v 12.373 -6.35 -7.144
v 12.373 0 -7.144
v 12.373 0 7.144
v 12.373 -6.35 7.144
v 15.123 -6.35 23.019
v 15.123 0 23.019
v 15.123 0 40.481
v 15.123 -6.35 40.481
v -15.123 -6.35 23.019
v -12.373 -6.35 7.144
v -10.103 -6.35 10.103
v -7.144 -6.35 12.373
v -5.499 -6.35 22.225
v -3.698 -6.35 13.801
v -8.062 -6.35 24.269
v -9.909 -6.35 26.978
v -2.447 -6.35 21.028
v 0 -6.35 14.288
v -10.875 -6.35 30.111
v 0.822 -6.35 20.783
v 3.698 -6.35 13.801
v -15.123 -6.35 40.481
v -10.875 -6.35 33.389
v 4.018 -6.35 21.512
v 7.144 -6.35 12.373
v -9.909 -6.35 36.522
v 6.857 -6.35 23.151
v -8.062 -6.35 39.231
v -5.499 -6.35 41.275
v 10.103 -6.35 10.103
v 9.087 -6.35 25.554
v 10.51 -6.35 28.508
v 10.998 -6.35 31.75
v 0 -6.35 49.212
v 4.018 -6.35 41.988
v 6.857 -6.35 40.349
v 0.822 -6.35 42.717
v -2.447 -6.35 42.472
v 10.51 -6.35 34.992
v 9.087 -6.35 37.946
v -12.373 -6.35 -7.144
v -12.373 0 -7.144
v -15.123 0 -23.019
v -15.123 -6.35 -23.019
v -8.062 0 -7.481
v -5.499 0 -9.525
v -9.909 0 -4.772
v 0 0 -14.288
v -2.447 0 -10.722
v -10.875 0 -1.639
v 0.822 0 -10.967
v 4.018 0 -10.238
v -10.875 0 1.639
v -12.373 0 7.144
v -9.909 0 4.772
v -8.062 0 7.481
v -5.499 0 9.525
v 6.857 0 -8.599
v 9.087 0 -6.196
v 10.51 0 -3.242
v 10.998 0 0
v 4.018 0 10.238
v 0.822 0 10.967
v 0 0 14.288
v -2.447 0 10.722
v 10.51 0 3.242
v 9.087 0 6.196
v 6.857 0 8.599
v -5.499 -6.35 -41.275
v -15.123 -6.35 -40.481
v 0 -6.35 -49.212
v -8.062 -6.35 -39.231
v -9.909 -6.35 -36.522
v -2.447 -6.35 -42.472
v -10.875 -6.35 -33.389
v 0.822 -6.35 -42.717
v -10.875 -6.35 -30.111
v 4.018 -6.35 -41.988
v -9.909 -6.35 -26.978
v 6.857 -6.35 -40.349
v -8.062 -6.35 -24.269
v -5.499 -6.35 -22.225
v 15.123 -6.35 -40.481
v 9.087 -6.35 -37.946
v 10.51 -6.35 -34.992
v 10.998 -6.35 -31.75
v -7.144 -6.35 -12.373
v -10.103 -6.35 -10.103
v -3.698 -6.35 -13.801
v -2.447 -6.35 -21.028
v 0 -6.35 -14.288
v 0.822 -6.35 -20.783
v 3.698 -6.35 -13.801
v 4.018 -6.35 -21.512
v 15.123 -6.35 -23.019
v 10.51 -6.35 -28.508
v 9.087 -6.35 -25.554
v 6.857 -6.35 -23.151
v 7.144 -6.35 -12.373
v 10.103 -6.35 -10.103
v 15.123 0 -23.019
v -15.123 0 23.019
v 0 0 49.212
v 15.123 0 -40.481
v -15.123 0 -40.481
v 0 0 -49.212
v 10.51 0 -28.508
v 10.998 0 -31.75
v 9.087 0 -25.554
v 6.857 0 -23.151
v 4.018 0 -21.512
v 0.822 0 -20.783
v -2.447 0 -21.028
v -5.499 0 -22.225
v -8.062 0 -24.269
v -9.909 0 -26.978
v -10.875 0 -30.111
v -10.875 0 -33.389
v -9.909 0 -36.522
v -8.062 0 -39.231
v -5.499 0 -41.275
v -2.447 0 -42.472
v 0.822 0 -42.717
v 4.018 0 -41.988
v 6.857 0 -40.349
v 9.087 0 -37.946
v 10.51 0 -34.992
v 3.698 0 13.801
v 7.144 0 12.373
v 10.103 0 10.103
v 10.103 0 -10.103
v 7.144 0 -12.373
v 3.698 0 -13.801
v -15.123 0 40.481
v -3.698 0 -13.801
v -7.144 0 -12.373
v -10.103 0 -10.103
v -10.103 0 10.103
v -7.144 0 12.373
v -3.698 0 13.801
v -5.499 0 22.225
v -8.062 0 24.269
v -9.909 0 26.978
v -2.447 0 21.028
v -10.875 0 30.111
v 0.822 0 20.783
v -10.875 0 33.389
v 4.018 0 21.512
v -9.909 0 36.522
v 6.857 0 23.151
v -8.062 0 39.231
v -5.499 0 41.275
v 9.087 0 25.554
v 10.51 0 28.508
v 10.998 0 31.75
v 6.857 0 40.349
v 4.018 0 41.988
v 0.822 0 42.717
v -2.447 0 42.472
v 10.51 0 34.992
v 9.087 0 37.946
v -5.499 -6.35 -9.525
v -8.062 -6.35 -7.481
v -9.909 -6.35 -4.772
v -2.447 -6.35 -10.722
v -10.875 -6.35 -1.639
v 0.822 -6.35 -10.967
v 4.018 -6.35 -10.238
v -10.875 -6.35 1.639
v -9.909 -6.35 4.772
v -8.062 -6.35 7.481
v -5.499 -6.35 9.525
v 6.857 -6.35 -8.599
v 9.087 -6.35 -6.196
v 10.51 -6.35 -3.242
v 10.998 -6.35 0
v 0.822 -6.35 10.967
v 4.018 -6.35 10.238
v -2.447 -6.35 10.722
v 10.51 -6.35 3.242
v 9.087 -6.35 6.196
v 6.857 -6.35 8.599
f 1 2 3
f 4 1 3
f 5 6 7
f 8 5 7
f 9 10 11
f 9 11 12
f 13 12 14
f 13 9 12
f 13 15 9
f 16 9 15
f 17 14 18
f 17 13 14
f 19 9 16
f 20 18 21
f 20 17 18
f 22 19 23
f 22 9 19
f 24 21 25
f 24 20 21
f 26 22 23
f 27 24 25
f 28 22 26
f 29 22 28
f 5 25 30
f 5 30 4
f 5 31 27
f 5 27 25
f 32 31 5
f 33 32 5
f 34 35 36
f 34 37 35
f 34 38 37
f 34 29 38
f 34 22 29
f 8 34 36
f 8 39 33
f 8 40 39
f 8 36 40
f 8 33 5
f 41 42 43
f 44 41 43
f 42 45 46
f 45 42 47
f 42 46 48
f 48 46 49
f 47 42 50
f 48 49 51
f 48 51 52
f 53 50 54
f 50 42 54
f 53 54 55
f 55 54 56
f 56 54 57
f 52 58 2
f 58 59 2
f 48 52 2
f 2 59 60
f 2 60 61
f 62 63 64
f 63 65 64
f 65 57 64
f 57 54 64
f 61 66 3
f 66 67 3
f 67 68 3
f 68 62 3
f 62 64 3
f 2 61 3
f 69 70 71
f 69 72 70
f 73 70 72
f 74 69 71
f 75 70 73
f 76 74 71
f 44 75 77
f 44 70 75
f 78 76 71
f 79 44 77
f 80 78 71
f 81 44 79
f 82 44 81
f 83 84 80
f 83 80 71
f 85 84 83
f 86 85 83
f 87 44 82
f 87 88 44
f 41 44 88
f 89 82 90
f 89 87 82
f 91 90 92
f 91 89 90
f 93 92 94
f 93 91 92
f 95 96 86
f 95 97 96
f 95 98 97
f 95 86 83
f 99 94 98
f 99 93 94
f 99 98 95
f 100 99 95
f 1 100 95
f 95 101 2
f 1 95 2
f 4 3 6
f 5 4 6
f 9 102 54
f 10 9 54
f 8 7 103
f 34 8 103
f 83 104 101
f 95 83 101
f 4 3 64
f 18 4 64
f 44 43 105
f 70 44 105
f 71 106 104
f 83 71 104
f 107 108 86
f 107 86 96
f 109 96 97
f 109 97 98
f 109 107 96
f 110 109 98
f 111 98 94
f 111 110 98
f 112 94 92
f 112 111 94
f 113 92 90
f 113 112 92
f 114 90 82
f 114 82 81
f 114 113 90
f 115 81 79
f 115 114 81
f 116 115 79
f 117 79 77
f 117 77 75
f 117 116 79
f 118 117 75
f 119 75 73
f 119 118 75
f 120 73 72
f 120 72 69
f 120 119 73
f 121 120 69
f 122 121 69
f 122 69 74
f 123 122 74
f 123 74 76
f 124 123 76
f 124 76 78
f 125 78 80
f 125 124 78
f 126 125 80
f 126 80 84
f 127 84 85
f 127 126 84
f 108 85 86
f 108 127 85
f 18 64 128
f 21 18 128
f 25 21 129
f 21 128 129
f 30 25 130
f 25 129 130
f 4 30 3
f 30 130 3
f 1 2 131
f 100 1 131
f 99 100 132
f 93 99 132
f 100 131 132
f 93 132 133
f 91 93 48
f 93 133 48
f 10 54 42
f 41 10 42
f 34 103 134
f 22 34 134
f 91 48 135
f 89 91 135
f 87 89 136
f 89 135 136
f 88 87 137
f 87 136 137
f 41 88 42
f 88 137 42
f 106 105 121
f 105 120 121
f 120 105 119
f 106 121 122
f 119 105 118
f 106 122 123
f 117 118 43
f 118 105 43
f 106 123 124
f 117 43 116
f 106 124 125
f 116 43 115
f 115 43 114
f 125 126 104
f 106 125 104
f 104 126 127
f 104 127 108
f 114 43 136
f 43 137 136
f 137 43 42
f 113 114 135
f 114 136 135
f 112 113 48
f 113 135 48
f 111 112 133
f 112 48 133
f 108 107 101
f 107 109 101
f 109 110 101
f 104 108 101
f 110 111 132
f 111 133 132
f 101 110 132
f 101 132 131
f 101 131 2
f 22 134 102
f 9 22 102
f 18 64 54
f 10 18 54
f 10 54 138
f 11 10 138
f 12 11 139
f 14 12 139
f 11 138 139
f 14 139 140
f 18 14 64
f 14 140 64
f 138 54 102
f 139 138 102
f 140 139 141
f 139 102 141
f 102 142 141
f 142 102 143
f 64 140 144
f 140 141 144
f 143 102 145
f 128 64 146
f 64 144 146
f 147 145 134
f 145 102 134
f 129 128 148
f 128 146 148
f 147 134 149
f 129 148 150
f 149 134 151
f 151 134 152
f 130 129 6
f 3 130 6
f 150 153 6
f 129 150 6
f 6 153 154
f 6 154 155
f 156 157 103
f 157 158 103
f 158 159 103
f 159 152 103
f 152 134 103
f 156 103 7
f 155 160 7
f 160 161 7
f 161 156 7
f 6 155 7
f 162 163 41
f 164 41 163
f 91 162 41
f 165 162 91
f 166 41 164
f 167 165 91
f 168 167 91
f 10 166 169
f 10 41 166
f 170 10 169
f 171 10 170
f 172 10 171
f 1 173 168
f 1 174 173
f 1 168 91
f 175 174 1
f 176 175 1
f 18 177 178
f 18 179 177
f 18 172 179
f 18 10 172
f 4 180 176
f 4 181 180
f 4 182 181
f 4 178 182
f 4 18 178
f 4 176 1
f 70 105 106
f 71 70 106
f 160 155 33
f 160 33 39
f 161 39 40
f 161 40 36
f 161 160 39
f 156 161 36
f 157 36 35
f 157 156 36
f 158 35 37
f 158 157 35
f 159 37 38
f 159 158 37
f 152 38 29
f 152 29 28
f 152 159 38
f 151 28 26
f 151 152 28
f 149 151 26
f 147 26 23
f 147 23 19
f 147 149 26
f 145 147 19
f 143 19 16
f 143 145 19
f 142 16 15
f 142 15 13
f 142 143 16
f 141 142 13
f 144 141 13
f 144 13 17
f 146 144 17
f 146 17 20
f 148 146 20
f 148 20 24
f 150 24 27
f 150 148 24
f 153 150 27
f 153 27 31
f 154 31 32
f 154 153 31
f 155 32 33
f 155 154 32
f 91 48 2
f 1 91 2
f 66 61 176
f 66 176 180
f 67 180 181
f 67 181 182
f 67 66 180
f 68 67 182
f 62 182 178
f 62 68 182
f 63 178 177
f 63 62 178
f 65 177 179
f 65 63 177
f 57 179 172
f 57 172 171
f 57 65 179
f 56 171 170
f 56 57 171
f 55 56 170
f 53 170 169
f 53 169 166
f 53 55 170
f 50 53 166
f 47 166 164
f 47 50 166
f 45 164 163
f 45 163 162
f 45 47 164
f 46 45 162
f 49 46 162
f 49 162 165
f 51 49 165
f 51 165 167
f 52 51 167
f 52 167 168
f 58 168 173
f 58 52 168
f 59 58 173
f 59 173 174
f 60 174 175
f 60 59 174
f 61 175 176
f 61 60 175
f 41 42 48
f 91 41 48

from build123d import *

# Parameters (mm, degrees)
F0_R     = 14.2875
F0_R_2   = 10.9982
F1_DEPTH = 6.35


with BuildPart() as f1:
    # F0 (on Front) → F1 (new body)
    with BuildSketch(Plane.XZ):
        with BuildLine():
            Line((-15.122969, -23.01875), (0, -14.2875))
            ThreePointArc((0, -14.2875), (-7.14375, -12.373338), (-12.373338, -7.14375))
            Line((-12.373338, -7.14375), (-15.122969, -23.01875))
        make_face()
        with BuildLine():
            Line((15.122969, -23.01875), (12.373338, -7.14375))
            ThreePointArc((12.373338, -7.14375), (7.14375, -12.373338), (0, -14.2875))
            Line((0, -14.2875), (15.122969, -23.01875))
        make_face()
        Polygon((-15.122969, 23.01875), (0, 14.2875), (15.122969, 23.01875), (15.122969, 40.48125), (0, 49.2125), (-15.122969, 40.48125), align=None)
        with Locations((0, 31.75)):
            Circle(F0_R, mode=Mode.SUBTRACT)
        Polygon((15.122969, -23.01875), (0, -14.2875), (-15.122969, -23.01875), (-15.122969, -40.48125), (0, -49.2125), (15.122969, -40.48125), align=None)
        with Locations((0, -31.75)):
            Circle(F0_R, mode=Mode.SUBTRACT)
        Polygon((12.373338, -7.14375), (12.373338, 7.14375), (0, 14.2875), (-12.373338, 7.14375), (-12.373338, -7.14375), (0, -14.2875), align=None)
        Circle(F0_R_2, mode=Mode.SUBTRACT)
        with Locations((0, -31.75)):
            Circle(F0_R)
        with Locations((0, -31.75)):
            Circle(F0_R_2, mode=Mode.SUBTRACT)
        with Locations((0, 31.75)):
            Circle(F0_R)
        with Locations((0, 31.75)):
            Circle(F0_R_2, mode=Mode.SUBTRACT)
        with BuildLine():
            ThreePointArc((-12.373338, 7.14375), (-7.14375, 12.373338), (0, 14.2875))
            Line((0, 14.2875), (-15.122969, 23.01875))
            Line((-15.122969, 23.01875), (-12.373338, 7.14375))
        make_face()
        with BuildLine():
            ThreePointArc((0, 14.2875), (7.14375, 12.373338), (12.373338, 7.14375))
            Line((12.373338, 7.14375), (15.122969, 23.01875))
            Line((15.122969, 23.01875), (0, 14.2875))
        make_face()
    extrude(amount=F1_DEPTH)


solid = f1.part
